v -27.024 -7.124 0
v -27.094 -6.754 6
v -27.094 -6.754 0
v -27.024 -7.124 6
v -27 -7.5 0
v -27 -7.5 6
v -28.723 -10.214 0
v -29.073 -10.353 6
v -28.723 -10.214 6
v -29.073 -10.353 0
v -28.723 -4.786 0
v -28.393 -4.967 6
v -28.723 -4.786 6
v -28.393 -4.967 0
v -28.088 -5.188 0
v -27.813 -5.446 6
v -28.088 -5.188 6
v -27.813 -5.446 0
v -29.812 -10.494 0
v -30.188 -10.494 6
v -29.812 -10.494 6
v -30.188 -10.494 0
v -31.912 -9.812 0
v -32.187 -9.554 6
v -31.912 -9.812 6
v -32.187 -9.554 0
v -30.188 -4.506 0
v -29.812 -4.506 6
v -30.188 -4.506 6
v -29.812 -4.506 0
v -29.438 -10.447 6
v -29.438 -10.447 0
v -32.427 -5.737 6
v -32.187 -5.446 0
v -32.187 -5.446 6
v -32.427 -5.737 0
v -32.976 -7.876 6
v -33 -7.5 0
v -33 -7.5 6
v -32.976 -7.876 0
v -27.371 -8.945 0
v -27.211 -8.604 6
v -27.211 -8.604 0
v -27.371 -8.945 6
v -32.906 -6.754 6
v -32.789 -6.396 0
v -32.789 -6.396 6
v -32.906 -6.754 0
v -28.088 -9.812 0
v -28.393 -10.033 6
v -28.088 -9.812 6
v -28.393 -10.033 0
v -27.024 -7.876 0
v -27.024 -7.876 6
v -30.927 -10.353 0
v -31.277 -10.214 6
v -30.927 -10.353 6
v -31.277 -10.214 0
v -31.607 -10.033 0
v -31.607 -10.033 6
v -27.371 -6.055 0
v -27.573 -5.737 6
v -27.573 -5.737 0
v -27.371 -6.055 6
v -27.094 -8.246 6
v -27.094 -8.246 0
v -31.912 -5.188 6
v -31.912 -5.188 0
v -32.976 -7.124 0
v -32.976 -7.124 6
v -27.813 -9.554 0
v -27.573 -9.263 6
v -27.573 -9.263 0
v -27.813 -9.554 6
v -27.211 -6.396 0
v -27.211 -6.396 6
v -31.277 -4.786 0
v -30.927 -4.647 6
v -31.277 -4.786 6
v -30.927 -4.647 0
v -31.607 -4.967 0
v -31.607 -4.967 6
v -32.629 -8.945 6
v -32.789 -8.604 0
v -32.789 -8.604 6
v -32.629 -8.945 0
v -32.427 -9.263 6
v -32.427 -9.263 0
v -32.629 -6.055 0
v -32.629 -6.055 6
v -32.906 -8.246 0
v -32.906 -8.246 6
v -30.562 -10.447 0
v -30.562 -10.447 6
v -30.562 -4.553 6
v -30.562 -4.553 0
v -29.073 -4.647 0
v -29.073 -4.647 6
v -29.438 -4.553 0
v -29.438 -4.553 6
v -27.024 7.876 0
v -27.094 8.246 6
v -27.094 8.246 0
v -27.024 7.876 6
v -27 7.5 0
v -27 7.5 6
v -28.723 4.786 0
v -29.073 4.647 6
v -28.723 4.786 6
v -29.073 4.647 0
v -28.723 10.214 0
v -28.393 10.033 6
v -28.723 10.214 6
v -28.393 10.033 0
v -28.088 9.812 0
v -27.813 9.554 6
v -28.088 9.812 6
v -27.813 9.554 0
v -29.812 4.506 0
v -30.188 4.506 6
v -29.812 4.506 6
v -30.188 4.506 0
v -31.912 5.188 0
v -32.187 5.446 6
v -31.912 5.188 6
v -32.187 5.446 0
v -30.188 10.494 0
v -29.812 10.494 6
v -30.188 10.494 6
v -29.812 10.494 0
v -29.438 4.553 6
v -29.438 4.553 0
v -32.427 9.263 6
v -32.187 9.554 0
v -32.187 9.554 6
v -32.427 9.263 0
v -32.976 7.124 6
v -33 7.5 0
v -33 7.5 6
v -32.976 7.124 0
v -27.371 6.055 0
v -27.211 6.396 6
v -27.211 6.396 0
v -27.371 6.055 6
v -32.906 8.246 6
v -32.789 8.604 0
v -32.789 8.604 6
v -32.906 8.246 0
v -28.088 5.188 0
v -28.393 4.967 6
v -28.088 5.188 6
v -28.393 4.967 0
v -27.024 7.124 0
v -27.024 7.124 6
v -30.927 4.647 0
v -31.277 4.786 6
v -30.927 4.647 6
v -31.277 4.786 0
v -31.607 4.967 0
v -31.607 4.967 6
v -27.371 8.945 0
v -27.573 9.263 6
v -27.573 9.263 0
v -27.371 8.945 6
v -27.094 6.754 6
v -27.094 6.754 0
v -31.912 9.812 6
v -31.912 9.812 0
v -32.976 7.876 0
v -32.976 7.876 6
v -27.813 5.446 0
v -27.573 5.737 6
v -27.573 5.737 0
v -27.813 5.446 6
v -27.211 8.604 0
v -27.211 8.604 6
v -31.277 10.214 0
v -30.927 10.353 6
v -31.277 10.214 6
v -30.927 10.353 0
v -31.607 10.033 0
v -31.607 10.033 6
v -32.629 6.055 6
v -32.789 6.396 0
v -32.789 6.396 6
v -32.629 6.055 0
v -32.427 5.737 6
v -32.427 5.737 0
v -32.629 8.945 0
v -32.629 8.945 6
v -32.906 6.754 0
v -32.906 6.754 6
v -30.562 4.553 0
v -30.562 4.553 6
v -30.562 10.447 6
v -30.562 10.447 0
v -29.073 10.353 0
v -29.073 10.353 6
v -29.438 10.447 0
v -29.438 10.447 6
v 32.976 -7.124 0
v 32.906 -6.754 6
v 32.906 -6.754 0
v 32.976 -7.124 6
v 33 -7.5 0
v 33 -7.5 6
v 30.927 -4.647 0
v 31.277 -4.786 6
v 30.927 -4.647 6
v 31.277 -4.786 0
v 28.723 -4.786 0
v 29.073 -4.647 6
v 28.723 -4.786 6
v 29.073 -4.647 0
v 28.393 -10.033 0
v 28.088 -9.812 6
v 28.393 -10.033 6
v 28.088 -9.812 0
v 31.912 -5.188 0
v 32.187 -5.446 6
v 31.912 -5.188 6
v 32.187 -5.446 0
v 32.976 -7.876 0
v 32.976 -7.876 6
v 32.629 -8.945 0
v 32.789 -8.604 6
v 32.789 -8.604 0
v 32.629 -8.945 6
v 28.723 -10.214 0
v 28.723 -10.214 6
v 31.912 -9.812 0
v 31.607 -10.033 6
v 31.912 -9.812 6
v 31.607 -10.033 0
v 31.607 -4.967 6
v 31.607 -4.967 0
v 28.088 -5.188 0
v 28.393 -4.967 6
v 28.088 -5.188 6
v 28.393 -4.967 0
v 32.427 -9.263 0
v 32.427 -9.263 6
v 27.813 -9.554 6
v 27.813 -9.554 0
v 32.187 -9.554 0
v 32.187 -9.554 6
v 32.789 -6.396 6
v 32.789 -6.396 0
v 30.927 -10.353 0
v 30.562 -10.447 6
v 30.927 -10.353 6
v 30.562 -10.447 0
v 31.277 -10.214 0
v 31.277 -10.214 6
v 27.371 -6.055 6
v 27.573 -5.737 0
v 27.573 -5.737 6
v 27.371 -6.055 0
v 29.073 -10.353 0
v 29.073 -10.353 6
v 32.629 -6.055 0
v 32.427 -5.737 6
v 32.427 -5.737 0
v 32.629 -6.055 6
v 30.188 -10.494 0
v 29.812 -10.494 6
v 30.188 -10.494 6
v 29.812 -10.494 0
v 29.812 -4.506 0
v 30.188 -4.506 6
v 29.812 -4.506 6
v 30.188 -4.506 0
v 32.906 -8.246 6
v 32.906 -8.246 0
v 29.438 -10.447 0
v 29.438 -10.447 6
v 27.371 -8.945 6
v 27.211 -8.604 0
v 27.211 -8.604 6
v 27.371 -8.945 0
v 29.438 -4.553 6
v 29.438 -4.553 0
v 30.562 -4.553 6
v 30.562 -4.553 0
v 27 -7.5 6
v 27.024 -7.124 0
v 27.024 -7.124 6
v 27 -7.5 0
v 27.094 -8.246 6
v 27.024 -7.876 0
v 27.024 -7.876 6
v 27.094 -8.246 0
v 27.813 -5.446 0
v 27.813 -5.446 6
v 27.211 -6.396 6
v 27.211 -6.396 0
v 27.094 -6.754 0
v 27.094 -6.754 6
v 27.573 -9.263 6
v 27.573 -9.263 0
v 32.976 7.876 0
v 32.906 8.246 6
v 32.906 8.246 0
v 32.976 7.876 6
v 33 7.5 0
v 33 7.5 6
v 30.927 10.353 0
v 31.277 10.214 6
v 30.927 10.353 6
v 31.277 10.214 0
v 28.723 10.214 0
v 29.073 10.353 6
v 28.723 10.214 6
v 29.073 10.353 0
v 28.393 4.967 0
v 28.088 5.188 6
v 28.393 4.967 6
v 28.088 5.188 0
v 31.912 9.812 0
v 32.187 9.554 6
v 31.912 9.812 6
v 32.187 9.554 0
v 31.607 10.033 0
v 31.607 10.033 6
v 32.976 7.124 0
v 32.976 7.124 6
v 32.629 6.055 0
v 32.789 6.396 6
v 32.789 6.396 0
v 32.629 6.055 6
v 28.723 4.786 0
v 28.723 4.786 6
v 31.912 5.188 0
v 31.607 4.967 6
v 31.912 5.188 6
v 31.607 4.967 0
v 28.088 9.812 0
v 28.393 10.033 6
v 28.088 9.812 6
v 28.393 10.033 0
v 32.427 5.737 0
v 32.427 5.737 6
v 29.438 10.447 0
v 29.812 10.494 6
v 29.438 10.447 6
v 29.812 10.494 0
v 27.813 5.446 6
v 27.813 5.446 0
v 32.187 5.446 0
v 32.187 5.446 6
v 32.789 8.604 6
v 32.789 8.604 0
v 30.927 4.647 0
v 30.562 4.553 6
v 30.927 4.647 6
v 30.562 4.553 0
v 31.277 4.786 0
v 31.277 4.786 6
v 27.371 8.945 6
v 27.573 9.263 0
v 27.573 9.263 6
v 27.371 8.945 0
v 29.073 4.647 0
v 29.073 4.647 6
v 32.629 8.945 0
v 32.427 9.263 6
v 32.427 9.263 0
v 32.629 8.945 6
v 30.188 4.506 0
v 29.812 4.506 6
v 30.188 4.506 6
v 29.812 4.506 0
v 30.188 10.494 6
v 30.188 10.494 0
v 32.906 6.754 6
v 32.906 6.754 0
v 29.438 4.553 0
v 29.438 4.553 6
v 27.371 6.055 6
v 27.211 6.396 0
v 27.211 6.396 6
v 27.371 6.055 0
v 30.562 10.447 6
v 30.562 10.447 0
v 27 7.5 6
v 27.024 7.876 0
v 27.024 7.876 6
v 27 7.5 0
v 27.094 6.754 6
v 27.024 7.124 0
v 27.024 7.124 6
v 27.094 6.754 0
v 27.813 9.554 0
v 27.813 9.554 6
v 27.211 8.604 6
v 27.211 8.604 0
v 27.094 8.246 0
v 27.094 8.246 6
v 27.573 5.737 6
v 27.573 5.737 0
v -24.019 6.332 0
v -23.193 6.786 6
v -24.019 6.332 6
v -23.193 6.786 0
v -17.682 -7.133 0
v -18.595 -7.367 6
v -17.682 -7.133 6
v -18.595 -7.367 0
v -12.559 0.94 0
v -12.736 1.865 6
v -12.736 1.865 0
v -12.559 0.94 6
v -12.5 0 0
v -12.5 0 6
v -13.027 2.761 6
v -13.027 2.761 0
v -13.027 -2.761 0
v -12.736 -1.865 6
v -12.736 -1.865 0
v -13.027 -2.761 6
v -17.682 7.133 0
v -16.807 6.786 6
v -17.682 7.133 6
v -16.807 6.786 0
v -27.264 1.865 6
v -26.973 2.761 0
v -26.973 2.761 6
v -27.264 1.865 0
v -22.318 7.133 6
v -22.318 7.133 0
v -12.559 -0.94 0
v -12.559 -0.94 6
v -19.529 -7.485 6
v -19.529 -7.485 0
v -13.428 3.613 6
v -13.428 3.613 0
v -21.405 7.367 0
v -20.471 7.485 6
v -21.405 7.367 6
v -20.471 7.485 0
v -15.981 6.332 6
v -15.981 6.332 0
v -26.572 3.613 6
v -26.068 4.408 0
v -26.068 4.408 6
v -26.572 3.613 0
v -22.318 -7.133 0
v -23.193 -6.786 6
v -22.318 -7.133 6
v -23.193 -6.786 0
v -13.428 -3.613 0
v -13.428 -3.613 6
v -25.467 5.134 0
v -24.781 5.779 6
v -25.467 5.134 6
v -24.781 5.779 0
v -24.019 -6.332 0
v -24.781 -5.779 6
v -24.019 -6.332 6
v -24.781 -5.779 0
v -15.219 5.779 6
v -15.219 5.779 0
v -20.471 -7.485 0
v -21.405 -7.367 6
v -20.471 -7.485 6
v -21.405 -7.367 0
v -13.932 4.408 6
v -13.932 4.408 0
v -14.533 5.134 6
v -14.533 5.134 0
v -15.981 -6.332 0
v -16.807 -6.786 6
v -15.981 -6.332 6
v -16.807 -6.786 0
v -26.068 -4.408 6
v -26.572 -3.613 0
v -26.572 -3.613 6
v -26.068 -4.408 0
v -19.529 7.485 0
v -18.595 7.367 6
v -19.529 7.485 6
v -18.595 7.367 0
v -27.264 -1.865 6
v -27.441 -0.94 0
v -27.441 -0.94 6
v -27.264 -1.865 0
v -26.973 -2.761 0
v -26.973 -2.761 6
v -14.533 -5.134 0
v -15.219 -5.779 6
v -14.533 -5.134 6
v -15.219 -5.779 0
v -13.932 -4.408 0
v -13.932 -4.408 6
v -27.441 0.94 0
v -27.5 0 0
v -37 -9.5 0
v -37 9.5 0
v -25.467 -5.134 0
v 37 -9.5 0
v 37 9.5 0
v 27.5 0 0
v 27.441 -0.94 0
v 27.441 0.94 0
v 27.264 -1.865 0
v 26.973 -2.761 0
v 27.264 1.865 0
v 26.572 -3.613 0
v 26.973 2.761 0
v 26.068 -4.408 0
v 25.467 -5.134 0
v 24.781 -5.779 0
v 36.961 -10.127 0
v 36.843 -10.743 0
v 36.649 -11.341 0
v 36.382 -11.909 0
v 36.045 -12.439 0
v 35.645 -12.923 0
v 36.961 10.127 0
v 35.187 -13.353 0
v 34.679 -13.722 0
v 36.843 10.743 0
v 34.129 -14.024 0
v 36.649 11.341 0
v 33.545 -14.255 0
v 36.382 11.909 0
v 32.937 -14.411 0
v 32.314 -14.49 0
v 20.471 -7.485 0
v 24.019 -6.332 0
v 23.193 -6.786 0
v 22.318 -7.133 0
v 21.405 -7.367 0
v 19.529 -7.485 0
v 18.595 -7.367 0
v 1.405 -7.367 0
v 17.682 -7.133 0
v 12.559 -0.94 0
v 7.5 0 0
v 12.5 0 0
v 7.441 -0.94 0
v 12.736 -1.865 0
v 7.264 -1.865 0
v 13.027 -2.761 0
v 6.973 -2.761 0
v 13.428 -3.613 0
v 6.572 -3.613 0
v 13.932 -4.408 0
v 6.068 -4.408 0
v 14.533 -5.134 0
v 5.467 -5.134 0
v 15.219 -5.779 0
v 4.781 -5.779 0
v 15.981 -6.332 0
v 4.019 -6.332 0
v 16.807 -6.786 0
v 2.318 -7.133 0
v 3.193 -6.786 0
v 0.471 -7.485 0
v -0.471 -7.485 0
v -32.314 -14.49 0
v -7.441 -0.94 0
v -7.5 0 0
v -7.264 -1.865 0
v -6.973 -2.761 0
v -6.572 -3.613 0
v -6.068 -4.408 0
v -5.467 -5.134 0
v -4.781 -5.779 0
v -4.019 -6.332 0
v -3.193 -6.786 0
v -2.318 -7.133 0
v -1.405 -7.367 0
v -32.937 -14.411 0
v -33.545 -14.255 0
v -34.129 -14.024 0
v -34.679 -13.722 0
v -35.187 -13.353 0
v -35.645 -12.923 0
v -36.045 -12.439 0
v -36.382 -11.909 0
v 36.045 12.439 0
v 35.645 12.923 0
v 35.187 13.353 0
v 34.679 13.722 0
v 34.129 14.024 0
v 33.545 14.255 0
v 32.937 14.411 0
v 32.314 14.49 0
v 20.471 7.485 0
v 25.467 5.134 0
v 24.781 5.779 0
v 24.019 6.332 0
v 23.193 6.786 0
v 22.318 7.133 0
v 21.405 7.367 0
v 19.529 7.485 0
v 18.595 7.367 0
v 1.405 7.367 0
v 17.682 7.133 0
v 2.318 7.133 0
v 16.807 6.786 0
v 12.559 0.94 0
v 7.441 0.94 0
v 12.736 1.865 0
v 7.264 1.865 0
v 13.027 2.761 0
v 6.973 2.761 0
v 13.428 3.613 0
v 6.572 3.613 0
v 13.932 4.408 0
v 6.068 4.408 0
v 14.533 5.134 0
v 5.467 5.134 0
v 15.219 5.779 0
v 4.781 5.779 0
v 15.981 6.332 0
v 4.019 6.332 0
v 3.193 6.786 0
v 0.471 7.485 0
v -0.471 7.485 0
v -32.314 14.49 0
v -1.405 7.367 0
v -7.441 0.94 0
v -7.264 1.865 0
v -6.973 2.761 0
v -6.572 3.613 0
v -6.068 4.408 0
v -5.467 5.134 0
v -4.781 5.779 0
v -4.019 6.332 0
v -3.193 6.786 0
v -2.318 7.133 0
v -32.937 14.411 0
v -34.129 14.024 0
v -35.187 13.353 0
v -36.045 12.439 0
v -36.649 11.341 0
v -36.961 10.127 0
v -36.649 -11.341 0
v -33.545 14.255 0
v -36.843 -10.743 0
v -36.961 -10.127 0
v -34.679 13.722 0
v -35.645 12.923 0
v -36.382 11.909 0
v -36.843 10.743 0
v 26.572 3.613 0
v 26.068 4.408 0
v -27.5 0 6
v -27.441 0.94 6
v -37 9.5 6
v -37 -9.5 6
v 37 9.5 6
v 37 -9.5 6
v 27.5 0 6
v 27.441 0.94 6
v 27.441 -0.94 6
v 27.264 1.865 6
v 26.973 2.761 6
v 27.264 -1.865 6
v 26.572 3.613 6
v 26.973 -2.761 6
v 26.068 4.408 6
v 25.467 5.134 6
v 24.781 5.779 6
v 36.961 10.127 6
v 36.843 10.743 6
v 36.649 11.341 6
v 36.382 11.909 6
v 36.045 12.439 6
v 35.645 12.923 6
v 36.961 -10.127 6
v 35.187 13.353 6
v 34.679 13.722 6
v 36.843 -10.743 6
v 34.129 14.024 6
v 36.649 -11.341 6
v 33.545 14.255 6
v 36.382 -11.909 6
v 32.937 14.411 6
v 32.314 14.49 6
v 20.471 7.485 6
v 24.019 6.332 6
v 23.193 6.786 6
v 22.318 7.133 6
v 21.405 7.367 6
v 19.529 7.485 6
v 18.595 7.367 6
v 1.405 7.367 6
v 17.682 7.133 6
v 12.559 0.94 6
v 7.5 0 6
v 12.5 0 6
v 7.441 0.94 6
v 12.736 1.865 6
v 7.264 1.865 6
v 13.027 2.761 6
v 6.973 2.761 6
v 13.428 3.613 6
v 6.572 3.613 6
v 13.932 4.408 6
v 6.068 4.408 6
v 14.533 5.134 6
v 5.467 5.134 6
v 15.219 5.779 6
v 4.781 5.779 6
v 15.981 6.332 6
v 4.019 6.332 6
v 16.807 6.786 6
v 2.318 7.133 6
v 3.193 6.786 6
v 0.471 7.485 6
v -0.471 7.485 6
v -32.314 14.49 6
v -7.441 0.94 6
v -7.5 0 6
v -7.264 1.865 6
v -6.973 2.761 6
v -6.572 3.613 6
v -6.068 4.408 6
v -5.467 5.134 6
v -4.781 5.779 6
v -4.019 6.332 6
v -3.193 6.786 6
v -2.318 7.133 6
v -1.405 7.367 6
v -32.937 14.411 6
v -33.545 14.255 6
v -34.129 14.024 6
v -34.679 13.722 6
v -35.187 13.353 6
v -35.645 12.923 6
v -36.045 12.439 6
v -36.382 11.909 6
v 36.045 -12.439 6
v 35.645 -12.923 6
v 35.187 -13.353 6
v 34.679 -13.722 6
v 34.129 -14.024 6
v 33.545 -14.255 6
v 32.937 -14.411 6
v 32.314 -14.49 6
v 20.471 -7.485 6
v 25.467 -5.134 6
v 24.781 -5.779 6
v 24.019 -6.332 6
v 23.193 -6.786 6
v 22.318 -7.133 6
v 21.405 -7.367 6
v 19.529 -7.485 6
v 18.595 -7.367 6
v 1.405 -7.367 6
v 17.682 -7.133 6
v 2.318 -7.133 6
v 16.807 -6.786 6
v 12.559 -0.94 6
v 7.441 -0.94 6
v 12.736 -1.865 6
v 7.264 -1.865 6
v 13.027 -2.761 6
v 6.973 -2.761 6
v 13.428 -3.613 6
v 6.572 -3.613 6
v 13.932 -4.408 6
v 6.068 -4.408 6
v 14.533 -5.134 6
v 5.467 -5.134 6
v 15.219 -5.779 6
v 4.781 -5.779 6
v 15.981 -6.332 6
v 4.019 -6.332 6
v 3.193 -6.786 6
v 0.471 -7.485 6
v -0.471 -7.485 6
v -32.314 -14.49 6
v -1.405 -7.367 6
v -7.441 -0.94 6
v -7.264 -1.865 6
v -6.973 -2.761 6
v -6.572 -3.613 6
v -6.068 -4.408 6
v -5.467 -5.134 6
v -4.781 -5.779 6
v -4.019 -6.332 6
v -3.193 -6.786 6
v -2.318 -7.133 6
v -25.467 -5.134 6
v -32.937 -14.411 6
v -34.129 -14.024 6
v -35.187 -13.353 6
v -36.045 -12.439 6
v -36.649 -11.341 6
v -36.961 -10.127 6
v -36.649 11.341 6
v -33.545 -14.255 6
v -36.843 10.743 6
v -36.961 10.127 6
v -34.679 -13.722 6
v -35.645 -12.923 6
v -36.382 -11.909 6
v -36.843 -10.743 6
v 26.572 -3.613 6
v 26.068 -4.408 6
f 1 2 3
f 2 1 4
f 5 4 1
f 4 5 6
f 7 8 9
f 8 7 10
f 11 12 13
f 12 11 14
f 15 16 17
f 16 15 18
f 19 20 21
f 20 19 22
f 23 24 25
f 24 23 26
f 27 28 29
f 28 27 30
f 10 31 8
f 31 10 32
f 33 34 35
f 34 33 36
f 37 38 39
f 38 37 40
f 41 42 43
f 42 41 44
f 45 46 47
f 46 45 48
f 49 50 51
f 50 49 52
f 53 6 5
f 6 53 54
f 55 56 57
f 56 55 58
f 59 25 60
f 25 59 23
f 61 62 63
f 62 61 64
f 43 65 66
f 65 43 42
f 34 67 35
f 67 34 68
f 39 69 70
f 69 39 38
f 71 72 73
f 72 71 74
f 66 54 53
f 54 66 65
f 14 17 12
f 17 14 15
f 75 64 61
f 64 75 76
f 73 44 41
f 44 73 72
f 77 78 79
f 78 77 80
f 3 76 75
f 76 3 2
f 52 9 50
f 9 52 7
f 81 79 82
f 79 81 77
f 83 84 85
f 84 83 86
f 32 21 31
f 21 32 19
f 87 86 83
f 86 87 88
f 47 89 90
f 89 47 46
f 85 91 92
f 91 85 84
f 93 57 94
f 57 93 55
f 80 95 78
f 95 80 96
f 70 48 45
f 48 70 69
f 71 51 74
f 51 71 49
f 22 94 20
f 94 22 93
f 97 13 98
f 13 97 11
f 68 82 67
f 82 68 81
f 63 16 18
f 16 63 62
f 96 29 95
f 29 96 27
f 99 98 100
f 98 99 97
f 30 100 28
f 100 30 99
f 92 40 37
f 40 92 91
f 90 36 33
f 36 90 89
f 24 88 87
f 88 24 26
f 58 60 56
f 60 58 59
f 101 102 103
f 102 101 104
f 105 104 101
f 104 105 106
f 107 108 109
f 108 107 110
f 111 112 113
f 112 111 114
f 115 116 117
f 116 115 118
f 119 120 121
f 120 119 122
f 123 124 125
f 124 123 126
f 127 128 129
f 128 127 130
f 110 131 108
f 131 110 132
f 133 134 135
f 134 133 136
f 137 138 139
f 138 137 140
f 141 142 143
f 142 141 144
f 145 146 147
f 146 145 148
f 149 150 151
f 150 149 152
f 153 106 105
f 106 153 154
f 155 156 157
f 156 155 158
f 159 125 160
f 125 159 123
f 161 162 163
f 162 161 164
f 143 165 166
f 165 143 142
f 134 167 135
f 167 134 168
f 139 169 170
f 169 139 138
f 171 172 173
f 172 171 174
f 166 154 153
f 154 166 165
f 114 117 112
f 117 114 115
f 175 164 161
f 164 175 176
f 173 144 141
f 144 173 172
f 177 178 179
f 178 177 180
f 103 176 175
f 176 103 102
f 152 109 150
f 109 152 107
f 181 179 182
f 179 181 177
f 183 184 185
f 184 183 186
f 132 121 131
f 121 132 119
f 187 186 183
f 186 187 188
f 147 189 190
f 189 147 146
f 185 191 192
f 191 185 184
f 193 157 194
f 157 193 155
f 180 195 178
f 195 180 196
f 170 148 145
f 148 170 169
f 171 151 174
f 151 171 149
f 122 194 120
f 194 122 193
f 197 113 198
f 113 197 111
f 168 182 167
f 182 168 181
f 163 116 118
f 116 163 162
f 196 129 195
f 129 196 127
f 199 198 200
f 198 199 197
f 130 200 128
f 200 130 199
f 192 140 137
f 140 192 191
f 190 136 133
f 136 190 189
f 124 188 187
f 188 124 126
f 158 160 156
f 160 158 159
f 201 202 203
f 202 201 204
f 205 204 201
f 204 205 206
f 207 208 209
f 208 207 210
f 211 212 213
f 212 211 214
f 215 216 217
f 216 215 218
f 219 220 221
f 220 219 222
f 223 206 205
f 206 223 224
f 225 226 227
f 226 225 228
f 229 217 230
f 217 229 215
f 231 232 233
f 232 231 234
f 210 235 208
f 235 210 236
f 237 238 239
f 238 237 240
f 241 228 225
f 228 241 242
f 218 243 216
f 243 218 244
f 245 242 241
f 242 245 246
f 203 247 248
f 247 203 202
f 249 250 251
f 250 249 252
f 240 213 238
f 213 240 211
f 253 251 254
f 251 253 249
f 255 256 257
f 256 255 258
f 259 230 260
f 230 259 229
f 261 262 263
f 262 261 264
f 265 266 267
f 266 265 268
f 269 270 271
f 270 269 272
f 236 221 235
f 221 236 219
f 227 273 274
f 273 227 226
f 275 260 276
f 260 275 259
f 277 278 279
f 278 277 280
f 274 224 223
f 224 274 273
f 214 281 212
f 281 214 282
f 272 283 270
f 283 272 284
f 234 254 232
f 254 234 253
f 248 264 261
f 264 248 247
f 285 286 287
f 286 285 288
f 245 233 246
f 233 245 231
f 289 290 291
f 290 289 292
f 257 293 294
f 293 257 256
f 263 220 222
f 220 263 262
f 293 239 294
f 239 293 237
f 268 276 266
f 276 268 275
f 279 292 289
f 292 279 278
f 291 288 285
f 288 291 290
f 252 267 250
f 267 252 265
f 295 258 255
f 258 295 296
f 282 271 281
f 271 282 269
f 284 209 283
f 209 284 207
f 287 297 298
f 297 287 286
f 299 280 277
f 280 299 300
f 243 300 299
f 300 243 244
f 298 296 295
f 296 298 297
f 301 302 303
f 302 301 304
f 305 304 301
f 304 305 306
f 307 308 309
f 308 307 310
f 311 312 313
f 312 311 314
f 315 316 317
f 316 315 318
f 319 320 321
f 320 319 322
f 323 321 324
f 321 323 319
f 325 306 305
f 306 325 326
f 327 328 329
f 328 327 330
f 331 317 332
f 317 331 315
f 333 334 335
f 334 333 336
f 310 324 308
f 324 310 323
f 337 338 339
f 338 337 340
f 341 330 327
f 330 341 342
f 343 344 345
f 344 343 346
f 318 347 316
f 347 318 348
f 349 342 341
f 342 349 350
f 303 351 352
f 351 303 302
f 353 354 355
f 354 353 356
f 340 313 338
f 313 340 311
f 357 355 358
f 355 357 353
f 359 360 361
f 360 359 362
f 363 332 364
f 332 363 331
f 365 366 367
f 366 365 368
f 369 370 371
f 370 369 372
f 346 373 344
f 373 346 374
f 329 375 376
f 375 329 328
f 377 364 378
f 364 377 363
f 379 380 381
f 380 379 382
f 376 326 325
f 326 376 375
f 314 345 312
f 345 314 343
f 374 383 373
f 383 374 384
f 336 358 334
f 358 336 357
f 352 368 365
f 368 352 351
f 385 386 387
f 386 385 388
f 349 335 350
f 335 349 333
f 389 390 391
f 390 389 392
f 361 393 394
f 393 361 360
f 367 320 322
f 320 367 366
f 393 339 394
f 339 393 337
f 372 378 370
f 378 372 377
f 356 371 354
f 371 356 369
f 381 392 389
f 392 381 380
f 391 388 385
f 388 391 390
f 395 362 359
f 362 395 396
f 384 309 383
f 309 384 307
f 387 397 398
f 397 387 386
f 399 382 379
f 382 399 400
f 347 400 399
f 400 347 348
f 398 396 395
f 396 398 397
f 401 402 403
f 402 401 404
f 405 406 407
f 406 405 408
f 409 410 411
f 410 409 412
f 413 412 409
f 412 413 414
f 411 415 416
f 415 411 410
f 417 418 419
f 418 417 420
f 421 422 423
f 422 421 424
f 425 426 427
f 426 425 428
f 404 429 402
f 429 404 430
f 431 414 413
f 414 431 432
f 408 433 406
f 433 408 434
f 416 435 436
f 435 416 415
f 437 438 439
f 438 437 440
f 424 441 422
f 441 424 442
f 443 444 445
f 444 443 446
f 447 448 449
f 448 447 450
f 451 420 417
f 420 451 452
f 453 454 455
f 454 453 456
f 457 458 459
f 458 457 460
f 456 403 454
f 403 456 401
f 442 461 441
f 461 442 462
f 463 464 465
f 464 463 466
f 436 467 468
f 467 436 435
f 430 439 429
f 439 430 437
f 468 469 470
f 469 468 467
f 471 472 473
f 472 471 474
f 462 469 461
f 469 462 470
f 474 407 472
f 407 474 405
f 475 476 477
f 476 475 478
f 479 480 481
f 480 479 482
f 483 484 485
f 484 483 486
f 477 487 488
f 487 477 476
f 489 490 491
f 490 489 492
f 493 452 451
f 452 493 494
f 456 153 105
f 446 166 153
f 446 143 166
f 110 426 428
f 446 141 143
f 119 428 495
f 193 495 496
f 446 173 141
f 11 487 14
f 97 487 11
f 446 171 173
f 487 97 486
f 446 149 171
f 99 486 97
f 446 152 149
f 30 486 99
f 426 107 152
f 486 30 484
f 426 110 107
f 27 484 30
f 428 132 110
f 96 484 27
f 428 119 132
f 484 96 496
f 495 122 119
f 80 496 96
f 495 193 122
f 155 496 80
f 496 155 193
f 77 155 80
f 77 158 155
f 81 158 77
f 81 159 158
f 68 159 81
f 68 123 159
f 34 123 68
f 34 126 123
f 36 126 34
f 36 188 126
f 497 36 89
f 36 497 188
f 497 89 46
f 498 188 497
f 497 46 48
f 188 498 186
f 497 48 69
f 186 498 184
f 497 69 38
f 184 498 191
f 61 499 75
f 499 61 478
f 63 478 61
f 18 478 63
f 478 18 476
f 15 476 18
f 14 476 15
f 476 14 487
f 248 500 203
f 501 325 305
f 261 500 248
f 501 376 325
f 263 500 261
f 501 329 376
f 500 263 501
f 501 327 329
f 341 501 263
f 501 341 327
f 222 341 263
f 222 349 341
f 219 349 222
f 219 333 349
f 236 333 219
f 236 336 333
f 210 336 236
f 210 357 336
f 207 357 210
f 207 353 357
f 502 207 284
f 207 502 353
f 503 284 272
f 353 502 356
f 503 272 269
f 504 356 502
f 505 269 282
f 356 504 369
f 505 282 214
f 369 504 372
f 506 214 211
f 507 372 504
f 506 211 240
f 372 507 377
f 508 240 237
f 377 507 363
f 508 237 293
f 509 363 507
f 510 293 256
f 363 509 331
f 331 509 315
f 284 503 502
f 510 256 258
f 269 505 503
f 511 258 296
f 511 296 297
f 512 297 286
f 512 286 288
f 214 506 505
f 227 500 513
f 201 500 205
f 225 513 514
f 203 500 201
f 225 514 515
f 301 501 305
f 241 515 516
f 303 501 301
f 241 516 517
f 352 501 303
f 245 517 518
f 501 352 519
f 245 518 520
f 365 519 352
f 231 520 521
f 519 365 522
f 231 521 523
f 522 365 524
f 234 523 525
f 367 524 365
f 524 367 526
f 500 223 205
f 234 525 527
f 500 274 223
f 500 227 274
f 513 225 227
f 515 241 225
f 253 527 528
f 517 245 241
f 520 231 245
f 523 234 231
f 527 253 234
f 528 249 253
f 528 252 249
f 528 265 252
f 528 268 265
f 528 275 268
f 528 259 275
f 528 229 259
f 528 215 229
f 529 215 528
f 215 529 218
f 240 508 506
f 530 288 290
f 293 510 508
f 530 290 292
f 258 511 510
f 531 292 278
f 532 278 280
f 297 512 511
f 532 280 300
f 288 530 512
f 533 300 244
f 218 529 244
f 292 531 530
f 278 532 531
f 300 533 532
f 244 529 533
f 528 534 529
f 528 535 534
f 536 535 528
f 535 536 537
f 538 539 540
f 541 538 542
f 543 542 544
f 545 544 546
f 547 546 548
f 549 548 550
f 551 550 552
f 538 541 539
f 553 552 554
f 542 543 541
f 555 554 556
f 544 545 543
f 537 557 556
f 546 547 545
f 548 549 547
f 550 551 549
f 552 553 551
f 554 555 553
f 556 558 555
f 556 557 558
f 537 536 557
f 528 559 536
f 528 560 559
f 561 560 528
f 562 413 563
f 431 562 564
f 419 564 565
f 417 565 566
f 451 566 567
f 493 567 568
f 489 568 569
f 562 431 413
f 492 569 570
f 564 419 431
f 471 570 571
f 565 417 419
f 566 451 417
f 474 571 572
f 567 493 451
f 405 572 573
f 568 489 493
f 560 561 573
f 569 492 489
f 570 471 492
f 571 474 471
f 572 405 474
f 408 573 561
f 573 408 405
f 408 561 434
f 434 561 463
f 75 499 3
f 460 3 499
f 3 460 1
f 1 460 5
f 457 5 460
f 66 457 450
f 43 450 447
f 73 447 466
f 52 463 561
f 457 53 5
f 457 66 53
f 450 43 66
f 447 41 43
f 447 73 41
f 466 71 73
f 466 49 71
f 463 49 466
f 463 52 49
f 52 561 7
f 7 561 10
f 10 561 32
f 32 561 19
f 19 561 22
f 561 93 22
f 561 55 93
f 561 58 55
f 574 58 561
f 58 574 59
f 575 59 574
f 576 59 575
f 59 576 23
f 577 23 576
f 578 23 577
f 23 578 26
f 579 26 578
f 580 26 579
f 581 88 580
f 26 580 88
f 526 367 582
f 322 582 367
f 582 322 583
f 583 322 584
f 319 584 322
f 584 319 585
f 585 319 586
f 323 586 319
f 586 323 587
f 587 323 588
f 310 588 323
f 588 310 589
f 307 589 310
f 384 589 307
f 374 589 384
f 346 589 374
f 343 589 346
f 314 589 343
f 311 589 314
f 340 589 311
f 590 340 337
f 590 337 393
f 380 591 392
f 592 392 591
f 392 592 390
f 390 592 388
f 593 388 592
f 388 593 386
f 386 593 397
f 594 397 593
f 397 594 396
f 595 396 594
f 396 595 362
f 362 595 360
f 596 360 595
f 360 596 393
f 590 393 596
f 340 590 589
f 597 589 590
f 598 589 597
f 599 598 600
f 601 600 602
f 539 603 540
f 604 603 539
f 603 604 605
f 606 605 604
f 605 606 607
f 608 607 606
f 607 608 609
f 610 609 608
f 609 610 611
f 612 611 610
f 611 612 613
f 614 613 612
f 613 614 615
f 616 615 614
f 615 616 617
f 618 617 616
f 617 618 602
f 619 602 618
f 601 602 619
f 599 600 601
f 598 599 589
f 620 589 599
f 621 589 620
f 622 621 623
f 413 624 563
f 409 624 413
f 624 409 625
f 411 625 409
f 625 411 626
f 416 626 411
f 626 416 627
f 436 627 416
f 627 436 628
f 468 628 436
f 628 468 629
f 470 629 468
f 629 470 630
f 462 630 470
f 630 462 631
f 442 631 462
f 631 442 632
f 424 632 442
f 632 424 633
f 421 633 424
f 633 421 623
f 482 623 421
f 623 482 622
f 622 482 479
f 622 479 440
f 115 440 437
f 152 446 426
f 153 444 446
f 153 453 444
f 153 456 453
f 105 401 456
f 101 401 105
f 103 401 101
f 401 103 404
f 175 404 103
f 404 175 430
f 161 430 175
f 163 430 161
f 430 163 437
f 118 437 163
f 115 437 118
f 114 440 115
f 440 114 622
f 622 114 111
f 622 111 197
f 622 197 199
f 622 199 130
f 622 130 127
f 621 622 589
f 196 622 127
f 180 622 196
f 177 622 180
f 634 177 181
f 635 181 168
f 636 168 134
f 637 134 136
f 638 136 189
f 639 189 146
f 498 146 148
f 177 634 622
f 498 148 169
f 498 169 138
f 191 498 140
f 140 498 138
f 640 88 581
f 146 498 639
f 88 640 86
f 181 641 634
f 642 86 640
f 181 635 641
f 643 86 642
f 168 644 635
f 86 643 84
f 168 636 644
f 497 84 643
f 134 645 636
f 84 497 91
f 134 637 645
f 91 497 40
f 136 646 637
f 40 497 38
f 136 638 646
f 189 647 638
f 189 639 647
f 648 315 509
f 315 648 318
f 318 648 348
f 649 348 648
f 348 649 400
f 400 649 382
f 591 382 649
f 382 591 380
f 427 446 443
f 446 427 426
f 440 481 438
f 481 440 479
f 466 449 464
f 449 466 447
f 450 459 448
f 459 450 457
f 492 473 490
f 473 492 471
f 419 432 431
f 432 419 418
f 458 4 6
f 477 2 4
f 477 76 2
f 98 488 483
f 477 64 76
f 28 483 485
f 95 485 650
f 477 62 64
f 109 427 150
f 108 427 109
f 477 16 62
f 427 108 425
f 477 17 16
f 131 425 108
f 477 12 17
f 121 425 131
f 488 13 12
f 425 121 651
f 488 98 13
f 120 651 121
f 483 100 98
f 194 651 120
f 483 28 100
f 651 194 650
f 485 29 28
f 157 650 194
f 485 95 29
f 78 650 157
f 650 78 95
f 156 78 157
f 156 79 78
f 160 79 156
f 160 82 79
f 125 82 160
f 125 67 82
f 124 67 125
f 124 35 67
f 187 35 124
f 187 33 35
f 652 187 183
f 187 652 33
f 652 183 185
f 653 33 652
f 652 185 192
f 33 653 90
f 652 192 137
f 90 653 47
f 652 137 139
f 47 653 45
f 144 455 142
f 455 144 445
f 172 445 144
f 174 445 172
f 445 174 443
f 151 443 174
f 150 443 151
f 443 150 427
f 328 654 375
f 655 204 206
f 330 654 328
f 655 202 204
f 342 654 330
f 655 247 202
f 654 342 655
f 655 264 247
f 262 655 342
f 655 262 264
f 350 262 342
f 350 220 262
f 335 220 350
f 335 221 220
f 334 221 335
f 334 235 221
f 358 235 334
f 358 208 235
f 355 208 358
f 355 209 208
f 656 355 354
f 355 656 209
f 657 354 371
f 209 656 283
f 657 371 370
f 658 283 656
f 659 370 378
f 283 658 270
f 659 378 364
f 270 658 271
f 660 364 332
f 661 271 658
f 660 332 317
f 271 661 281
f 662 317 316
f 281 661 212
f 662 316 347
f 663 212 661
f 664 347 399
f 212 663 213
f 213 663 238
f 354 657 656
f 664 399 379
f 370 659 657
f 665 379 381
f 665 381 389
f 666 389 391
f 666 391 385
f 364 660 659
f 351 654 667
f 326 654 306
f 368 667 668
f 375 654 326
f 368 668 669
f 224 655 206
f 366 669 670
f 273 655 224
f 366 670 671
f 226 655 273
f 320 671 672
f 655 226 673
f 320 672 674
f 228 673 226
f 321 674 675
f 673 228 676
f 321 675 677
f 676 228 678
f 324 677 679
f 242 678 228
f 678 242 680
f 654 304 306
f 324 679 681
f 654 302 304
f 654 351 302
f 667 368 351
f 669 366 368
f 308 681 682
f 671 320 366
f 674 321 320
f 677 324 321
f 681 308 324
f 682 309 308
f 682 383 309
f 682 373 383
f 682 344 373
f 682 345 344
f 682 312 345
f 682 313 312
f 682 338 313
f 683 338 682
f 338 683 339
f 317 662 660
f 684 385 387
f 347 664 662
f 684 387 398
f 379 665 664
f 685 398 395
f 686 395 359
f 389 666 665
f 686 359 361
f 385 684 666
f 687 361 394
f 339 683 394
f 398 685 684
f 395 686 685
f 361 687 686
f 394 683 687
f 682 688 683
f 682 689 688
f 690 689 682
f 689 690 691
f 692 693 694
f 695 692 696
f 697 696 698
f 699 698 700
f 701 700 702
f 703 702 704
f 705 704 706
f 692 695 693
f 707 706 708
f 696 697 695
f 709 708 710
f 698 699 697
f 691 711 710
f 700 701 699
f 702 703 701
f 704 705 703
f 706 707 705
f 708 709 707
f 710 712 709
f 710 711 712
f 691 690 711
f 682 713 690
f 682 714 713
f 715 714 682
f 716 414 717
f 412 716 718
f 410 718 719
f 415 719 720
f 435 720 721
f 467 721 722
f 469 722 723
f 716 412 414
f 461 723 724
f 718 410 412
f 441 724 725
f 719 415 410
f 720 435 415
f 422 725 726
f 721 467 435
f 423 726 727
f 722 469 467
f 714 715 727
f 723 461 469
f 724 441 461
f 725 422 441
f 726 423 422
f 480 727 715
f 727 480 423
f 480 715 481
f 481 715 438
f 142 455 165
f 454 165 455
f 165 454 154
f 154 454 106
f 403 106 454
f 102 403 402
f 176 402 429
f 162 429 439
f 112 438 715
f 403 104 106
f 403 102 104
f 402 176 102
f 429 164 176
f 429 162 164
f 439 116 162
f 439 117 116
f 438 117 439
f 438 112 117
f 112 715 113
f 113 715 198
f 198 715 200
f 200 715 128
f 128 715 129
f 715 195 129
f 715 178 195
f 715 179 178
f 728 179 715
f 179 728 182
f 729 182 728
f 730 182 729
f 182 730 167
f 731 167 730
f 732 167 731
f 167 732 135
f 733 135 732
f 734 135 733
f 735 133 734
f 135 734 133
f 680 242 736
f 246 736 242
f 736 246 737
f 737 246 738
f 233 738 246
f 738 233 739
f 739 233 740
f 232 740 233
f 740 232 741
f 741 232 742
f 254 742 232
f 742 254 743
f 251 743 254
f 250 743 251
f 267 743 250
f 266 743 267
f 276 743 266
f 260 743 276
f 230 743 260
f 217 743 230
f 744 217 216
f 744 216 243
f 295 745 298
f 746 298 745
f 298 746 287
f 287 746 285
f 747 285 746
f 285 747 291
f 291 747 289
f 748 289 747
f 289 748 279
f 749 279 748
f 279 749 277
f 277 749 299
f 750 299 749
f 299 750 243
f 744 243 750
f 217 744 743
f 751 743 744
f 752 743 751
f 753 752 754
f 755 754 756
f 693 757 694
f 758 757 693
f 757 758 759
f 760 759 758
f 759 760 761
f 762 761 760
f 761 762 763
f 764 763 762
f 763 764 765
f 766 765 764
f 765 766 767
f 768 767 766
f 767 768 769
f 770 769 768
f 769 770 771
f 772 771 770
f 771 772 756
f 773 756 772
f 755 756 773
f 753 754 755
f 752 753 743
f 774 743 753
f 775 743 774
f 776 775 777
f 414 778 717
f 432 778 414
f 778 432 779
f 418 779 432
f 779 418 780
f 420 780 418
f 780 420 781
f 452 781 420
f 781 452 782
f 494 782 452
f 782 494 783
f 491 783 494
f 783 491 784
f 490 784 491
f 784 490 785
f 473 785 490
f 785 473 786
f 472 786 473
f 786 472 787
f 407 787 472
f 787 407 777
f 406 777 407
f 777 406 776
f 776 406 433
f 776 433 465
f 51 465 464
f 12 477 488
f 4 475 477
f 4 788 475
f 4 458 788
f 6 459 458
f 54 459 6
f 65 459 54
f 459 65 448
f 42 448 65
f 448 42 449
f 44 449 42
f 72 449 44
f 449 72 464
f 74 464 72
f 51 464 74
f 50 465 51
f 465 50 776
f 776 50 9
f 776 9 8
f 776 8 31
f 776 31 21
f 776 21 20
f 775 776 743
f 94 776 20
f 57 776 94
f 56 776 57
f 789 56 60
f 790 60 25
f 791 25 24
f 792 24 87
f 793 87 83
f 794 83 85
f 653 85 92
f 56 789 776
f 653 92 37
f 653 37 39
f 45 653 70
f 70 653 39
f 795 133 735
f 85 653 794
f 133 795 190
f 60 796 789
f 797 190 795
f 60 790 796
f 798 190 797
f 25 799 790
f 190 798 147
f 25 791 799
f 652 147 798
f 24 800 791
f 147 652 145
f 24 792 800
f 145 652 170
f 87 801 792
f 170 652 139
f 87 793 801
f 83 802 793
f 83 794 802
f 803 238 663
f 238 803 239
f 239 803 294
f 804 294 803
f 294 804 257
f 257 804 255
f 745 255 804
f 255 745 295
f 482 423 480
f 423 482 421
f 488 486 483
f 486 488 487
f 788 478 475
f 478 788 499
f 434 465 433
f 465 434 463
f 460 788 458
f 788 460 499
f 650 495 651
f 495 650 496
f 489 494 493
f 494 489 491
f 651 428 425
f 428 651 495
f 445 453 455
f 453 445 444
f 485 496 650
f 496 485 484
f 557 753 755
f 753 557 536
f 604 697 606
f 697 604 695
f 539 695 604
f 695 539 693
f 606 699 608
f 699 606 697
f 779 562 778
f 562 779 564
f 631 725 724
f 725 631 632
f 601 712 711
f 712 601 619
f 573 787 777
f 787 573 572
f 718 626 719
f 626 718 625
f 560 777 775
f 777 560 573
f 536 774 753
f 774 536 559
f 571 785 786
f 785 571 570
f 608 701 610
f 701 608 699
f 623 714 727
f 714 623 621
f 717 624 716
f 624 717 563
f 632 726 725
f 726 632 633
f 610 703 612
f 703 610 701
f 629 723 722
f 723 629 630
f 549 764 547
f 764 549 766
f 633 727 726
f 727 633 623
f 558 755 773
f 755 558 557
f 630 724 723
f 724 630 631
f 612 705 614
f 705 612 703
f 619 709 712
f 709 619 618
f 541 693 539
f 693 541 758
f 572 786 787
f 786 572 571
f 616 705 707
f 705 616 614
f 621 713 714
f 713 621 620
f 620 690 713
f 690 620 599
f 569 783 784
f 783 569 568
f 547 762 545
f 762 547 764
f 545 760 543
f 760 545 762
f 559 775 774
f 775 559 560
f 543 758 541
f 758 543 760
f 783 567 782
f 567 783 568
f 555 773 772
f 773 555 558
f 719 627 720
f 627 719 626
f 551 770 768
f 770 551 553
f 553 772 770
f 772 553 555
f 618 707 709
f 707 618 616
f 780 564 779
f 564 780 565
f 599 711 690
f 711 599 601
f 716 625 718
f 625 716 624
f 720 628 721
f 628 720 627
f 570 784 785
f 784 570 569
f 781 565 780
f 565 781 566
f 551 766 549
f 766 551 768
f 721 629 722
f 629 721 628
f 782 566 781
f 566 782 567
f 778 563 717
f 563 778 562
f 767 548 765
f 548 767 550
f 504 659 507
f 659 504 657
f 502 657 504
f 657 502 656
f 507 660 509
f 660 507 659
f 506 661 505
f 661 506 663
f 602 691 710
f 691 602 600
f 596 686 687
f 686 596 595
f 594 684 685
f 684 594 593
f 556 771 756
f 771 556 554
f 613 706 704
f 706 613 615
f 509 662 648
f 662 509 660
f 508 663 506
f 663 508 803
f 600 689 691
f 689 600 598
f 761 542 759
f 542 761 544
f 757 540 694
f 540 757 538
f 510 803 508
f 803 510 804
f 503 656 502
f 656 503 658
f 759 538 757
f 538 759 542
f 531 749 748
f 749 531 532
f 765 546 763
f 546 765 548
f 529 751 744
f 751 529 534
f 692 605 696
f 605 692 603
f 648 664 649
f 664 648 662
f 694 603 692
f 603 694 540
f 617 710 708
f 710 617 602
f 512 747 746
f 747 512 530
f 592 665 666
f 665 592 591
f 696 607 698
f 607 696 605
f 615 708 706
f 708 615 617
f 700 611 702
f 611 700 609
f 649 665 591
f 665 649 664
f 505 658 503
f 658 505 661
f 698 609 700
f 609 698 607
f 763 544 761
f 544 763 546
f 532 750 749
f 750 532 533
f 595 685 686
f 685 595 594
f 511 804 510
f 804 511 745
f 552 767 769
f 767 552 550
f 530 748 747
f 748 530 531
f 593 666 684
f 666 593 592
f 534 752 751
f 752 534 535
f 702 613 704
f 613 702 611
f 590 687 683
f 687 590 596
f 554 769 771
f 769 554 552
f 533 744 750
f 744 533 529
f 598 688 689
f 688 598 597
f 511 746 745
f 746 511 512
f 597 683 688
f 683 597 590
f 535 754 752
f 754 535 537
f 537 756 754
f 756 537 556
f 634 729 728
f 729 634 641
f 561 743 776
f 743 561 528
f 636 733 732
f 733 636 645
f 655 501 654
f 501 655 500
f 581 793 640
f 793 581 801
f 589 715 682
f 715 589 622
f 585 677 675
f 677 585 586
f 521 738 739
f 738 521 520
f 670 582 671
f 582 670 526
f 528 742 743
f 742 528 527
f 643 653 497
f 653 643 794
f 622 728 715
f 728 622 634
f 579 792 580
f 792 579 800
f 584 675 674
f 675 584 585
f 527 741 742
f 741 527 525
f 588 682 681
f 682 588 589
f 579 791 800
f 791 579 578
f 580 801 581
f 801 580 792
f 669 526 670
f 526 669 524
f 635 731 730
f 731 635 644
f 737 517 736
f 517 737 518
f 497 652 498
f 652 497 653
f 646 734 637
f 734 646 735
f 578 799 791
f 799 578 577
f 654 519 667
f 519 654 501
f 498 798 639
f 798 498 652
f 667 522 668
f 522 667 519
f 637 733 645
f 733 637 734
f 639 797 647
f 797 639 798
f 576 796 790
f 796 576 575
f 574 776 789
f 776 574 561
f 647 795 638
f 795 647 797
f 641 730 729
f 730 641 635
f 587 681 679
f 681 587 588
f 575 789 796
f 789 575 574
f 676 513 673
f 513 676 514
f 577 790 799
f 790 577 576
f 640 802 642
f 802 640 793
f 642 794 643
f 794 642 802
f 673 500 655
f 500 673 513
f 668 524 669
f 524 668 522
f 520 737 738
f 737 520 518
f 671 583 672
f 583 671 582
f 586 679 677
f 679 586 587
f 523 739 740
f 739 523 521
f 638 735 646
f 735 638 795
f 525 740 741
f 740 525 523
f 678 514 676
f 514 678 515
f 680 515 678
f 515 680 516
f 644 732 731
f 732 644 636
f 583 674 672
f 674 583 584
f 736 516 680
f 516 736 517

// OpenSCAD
$fn = 50;


difference() {
	union() {
		hull() {
			translate(v = [-32.0000000000, 9.5000000000, 0]) {
				cylinder(h = 6, r = 5);
			}
			translate(v = [32.0000000000, 9.5000000000, 0]) {
				cylinder(h = 6, r = 5);
			}
			translate(v = [-32.0000000000, -9.5000000000, 0]) {
				cylinder(h = 6, r = 5);
			}
			translate(v = [32.0000000000, -9.5000000000, 0]) {
				cylinder(h = 6, r = 5);
			}
		}
	}
	union() {
		#translate(v = [-30.0000000000, -7.5000000000, -100.0000000000]) {
			cylinder(h = 200, r = 3.0000000000);
		}
		#translate(v = [-30.0000000000, 7.5000000000, -100.0000000000]) {
			cylinder(h = 200, r = 3.0000000000);
		}
		#translate(v = [30.0000000000, -7.5000000000, -100.0000000000]) {
			cylinder(h = 200, r = 3.0000000000);
		}
		#translate(v = [30.0000000000, 7.5000000000, -100.0000000000]) {
			cylinder(h = 200, r = 3.0000000000);
		}
		#translate(v = [-20.0000000000, 0, 0]) {
			cylinder(h = 6, r = 7.5000000000);
		}
		#cylinder(h = 6, r = 7.5000000000);
		#translate(v = [20.0000000000, 0, 0]) {
			cylinder(h = 6, r = 7.5000000000);
		}
	}
}
